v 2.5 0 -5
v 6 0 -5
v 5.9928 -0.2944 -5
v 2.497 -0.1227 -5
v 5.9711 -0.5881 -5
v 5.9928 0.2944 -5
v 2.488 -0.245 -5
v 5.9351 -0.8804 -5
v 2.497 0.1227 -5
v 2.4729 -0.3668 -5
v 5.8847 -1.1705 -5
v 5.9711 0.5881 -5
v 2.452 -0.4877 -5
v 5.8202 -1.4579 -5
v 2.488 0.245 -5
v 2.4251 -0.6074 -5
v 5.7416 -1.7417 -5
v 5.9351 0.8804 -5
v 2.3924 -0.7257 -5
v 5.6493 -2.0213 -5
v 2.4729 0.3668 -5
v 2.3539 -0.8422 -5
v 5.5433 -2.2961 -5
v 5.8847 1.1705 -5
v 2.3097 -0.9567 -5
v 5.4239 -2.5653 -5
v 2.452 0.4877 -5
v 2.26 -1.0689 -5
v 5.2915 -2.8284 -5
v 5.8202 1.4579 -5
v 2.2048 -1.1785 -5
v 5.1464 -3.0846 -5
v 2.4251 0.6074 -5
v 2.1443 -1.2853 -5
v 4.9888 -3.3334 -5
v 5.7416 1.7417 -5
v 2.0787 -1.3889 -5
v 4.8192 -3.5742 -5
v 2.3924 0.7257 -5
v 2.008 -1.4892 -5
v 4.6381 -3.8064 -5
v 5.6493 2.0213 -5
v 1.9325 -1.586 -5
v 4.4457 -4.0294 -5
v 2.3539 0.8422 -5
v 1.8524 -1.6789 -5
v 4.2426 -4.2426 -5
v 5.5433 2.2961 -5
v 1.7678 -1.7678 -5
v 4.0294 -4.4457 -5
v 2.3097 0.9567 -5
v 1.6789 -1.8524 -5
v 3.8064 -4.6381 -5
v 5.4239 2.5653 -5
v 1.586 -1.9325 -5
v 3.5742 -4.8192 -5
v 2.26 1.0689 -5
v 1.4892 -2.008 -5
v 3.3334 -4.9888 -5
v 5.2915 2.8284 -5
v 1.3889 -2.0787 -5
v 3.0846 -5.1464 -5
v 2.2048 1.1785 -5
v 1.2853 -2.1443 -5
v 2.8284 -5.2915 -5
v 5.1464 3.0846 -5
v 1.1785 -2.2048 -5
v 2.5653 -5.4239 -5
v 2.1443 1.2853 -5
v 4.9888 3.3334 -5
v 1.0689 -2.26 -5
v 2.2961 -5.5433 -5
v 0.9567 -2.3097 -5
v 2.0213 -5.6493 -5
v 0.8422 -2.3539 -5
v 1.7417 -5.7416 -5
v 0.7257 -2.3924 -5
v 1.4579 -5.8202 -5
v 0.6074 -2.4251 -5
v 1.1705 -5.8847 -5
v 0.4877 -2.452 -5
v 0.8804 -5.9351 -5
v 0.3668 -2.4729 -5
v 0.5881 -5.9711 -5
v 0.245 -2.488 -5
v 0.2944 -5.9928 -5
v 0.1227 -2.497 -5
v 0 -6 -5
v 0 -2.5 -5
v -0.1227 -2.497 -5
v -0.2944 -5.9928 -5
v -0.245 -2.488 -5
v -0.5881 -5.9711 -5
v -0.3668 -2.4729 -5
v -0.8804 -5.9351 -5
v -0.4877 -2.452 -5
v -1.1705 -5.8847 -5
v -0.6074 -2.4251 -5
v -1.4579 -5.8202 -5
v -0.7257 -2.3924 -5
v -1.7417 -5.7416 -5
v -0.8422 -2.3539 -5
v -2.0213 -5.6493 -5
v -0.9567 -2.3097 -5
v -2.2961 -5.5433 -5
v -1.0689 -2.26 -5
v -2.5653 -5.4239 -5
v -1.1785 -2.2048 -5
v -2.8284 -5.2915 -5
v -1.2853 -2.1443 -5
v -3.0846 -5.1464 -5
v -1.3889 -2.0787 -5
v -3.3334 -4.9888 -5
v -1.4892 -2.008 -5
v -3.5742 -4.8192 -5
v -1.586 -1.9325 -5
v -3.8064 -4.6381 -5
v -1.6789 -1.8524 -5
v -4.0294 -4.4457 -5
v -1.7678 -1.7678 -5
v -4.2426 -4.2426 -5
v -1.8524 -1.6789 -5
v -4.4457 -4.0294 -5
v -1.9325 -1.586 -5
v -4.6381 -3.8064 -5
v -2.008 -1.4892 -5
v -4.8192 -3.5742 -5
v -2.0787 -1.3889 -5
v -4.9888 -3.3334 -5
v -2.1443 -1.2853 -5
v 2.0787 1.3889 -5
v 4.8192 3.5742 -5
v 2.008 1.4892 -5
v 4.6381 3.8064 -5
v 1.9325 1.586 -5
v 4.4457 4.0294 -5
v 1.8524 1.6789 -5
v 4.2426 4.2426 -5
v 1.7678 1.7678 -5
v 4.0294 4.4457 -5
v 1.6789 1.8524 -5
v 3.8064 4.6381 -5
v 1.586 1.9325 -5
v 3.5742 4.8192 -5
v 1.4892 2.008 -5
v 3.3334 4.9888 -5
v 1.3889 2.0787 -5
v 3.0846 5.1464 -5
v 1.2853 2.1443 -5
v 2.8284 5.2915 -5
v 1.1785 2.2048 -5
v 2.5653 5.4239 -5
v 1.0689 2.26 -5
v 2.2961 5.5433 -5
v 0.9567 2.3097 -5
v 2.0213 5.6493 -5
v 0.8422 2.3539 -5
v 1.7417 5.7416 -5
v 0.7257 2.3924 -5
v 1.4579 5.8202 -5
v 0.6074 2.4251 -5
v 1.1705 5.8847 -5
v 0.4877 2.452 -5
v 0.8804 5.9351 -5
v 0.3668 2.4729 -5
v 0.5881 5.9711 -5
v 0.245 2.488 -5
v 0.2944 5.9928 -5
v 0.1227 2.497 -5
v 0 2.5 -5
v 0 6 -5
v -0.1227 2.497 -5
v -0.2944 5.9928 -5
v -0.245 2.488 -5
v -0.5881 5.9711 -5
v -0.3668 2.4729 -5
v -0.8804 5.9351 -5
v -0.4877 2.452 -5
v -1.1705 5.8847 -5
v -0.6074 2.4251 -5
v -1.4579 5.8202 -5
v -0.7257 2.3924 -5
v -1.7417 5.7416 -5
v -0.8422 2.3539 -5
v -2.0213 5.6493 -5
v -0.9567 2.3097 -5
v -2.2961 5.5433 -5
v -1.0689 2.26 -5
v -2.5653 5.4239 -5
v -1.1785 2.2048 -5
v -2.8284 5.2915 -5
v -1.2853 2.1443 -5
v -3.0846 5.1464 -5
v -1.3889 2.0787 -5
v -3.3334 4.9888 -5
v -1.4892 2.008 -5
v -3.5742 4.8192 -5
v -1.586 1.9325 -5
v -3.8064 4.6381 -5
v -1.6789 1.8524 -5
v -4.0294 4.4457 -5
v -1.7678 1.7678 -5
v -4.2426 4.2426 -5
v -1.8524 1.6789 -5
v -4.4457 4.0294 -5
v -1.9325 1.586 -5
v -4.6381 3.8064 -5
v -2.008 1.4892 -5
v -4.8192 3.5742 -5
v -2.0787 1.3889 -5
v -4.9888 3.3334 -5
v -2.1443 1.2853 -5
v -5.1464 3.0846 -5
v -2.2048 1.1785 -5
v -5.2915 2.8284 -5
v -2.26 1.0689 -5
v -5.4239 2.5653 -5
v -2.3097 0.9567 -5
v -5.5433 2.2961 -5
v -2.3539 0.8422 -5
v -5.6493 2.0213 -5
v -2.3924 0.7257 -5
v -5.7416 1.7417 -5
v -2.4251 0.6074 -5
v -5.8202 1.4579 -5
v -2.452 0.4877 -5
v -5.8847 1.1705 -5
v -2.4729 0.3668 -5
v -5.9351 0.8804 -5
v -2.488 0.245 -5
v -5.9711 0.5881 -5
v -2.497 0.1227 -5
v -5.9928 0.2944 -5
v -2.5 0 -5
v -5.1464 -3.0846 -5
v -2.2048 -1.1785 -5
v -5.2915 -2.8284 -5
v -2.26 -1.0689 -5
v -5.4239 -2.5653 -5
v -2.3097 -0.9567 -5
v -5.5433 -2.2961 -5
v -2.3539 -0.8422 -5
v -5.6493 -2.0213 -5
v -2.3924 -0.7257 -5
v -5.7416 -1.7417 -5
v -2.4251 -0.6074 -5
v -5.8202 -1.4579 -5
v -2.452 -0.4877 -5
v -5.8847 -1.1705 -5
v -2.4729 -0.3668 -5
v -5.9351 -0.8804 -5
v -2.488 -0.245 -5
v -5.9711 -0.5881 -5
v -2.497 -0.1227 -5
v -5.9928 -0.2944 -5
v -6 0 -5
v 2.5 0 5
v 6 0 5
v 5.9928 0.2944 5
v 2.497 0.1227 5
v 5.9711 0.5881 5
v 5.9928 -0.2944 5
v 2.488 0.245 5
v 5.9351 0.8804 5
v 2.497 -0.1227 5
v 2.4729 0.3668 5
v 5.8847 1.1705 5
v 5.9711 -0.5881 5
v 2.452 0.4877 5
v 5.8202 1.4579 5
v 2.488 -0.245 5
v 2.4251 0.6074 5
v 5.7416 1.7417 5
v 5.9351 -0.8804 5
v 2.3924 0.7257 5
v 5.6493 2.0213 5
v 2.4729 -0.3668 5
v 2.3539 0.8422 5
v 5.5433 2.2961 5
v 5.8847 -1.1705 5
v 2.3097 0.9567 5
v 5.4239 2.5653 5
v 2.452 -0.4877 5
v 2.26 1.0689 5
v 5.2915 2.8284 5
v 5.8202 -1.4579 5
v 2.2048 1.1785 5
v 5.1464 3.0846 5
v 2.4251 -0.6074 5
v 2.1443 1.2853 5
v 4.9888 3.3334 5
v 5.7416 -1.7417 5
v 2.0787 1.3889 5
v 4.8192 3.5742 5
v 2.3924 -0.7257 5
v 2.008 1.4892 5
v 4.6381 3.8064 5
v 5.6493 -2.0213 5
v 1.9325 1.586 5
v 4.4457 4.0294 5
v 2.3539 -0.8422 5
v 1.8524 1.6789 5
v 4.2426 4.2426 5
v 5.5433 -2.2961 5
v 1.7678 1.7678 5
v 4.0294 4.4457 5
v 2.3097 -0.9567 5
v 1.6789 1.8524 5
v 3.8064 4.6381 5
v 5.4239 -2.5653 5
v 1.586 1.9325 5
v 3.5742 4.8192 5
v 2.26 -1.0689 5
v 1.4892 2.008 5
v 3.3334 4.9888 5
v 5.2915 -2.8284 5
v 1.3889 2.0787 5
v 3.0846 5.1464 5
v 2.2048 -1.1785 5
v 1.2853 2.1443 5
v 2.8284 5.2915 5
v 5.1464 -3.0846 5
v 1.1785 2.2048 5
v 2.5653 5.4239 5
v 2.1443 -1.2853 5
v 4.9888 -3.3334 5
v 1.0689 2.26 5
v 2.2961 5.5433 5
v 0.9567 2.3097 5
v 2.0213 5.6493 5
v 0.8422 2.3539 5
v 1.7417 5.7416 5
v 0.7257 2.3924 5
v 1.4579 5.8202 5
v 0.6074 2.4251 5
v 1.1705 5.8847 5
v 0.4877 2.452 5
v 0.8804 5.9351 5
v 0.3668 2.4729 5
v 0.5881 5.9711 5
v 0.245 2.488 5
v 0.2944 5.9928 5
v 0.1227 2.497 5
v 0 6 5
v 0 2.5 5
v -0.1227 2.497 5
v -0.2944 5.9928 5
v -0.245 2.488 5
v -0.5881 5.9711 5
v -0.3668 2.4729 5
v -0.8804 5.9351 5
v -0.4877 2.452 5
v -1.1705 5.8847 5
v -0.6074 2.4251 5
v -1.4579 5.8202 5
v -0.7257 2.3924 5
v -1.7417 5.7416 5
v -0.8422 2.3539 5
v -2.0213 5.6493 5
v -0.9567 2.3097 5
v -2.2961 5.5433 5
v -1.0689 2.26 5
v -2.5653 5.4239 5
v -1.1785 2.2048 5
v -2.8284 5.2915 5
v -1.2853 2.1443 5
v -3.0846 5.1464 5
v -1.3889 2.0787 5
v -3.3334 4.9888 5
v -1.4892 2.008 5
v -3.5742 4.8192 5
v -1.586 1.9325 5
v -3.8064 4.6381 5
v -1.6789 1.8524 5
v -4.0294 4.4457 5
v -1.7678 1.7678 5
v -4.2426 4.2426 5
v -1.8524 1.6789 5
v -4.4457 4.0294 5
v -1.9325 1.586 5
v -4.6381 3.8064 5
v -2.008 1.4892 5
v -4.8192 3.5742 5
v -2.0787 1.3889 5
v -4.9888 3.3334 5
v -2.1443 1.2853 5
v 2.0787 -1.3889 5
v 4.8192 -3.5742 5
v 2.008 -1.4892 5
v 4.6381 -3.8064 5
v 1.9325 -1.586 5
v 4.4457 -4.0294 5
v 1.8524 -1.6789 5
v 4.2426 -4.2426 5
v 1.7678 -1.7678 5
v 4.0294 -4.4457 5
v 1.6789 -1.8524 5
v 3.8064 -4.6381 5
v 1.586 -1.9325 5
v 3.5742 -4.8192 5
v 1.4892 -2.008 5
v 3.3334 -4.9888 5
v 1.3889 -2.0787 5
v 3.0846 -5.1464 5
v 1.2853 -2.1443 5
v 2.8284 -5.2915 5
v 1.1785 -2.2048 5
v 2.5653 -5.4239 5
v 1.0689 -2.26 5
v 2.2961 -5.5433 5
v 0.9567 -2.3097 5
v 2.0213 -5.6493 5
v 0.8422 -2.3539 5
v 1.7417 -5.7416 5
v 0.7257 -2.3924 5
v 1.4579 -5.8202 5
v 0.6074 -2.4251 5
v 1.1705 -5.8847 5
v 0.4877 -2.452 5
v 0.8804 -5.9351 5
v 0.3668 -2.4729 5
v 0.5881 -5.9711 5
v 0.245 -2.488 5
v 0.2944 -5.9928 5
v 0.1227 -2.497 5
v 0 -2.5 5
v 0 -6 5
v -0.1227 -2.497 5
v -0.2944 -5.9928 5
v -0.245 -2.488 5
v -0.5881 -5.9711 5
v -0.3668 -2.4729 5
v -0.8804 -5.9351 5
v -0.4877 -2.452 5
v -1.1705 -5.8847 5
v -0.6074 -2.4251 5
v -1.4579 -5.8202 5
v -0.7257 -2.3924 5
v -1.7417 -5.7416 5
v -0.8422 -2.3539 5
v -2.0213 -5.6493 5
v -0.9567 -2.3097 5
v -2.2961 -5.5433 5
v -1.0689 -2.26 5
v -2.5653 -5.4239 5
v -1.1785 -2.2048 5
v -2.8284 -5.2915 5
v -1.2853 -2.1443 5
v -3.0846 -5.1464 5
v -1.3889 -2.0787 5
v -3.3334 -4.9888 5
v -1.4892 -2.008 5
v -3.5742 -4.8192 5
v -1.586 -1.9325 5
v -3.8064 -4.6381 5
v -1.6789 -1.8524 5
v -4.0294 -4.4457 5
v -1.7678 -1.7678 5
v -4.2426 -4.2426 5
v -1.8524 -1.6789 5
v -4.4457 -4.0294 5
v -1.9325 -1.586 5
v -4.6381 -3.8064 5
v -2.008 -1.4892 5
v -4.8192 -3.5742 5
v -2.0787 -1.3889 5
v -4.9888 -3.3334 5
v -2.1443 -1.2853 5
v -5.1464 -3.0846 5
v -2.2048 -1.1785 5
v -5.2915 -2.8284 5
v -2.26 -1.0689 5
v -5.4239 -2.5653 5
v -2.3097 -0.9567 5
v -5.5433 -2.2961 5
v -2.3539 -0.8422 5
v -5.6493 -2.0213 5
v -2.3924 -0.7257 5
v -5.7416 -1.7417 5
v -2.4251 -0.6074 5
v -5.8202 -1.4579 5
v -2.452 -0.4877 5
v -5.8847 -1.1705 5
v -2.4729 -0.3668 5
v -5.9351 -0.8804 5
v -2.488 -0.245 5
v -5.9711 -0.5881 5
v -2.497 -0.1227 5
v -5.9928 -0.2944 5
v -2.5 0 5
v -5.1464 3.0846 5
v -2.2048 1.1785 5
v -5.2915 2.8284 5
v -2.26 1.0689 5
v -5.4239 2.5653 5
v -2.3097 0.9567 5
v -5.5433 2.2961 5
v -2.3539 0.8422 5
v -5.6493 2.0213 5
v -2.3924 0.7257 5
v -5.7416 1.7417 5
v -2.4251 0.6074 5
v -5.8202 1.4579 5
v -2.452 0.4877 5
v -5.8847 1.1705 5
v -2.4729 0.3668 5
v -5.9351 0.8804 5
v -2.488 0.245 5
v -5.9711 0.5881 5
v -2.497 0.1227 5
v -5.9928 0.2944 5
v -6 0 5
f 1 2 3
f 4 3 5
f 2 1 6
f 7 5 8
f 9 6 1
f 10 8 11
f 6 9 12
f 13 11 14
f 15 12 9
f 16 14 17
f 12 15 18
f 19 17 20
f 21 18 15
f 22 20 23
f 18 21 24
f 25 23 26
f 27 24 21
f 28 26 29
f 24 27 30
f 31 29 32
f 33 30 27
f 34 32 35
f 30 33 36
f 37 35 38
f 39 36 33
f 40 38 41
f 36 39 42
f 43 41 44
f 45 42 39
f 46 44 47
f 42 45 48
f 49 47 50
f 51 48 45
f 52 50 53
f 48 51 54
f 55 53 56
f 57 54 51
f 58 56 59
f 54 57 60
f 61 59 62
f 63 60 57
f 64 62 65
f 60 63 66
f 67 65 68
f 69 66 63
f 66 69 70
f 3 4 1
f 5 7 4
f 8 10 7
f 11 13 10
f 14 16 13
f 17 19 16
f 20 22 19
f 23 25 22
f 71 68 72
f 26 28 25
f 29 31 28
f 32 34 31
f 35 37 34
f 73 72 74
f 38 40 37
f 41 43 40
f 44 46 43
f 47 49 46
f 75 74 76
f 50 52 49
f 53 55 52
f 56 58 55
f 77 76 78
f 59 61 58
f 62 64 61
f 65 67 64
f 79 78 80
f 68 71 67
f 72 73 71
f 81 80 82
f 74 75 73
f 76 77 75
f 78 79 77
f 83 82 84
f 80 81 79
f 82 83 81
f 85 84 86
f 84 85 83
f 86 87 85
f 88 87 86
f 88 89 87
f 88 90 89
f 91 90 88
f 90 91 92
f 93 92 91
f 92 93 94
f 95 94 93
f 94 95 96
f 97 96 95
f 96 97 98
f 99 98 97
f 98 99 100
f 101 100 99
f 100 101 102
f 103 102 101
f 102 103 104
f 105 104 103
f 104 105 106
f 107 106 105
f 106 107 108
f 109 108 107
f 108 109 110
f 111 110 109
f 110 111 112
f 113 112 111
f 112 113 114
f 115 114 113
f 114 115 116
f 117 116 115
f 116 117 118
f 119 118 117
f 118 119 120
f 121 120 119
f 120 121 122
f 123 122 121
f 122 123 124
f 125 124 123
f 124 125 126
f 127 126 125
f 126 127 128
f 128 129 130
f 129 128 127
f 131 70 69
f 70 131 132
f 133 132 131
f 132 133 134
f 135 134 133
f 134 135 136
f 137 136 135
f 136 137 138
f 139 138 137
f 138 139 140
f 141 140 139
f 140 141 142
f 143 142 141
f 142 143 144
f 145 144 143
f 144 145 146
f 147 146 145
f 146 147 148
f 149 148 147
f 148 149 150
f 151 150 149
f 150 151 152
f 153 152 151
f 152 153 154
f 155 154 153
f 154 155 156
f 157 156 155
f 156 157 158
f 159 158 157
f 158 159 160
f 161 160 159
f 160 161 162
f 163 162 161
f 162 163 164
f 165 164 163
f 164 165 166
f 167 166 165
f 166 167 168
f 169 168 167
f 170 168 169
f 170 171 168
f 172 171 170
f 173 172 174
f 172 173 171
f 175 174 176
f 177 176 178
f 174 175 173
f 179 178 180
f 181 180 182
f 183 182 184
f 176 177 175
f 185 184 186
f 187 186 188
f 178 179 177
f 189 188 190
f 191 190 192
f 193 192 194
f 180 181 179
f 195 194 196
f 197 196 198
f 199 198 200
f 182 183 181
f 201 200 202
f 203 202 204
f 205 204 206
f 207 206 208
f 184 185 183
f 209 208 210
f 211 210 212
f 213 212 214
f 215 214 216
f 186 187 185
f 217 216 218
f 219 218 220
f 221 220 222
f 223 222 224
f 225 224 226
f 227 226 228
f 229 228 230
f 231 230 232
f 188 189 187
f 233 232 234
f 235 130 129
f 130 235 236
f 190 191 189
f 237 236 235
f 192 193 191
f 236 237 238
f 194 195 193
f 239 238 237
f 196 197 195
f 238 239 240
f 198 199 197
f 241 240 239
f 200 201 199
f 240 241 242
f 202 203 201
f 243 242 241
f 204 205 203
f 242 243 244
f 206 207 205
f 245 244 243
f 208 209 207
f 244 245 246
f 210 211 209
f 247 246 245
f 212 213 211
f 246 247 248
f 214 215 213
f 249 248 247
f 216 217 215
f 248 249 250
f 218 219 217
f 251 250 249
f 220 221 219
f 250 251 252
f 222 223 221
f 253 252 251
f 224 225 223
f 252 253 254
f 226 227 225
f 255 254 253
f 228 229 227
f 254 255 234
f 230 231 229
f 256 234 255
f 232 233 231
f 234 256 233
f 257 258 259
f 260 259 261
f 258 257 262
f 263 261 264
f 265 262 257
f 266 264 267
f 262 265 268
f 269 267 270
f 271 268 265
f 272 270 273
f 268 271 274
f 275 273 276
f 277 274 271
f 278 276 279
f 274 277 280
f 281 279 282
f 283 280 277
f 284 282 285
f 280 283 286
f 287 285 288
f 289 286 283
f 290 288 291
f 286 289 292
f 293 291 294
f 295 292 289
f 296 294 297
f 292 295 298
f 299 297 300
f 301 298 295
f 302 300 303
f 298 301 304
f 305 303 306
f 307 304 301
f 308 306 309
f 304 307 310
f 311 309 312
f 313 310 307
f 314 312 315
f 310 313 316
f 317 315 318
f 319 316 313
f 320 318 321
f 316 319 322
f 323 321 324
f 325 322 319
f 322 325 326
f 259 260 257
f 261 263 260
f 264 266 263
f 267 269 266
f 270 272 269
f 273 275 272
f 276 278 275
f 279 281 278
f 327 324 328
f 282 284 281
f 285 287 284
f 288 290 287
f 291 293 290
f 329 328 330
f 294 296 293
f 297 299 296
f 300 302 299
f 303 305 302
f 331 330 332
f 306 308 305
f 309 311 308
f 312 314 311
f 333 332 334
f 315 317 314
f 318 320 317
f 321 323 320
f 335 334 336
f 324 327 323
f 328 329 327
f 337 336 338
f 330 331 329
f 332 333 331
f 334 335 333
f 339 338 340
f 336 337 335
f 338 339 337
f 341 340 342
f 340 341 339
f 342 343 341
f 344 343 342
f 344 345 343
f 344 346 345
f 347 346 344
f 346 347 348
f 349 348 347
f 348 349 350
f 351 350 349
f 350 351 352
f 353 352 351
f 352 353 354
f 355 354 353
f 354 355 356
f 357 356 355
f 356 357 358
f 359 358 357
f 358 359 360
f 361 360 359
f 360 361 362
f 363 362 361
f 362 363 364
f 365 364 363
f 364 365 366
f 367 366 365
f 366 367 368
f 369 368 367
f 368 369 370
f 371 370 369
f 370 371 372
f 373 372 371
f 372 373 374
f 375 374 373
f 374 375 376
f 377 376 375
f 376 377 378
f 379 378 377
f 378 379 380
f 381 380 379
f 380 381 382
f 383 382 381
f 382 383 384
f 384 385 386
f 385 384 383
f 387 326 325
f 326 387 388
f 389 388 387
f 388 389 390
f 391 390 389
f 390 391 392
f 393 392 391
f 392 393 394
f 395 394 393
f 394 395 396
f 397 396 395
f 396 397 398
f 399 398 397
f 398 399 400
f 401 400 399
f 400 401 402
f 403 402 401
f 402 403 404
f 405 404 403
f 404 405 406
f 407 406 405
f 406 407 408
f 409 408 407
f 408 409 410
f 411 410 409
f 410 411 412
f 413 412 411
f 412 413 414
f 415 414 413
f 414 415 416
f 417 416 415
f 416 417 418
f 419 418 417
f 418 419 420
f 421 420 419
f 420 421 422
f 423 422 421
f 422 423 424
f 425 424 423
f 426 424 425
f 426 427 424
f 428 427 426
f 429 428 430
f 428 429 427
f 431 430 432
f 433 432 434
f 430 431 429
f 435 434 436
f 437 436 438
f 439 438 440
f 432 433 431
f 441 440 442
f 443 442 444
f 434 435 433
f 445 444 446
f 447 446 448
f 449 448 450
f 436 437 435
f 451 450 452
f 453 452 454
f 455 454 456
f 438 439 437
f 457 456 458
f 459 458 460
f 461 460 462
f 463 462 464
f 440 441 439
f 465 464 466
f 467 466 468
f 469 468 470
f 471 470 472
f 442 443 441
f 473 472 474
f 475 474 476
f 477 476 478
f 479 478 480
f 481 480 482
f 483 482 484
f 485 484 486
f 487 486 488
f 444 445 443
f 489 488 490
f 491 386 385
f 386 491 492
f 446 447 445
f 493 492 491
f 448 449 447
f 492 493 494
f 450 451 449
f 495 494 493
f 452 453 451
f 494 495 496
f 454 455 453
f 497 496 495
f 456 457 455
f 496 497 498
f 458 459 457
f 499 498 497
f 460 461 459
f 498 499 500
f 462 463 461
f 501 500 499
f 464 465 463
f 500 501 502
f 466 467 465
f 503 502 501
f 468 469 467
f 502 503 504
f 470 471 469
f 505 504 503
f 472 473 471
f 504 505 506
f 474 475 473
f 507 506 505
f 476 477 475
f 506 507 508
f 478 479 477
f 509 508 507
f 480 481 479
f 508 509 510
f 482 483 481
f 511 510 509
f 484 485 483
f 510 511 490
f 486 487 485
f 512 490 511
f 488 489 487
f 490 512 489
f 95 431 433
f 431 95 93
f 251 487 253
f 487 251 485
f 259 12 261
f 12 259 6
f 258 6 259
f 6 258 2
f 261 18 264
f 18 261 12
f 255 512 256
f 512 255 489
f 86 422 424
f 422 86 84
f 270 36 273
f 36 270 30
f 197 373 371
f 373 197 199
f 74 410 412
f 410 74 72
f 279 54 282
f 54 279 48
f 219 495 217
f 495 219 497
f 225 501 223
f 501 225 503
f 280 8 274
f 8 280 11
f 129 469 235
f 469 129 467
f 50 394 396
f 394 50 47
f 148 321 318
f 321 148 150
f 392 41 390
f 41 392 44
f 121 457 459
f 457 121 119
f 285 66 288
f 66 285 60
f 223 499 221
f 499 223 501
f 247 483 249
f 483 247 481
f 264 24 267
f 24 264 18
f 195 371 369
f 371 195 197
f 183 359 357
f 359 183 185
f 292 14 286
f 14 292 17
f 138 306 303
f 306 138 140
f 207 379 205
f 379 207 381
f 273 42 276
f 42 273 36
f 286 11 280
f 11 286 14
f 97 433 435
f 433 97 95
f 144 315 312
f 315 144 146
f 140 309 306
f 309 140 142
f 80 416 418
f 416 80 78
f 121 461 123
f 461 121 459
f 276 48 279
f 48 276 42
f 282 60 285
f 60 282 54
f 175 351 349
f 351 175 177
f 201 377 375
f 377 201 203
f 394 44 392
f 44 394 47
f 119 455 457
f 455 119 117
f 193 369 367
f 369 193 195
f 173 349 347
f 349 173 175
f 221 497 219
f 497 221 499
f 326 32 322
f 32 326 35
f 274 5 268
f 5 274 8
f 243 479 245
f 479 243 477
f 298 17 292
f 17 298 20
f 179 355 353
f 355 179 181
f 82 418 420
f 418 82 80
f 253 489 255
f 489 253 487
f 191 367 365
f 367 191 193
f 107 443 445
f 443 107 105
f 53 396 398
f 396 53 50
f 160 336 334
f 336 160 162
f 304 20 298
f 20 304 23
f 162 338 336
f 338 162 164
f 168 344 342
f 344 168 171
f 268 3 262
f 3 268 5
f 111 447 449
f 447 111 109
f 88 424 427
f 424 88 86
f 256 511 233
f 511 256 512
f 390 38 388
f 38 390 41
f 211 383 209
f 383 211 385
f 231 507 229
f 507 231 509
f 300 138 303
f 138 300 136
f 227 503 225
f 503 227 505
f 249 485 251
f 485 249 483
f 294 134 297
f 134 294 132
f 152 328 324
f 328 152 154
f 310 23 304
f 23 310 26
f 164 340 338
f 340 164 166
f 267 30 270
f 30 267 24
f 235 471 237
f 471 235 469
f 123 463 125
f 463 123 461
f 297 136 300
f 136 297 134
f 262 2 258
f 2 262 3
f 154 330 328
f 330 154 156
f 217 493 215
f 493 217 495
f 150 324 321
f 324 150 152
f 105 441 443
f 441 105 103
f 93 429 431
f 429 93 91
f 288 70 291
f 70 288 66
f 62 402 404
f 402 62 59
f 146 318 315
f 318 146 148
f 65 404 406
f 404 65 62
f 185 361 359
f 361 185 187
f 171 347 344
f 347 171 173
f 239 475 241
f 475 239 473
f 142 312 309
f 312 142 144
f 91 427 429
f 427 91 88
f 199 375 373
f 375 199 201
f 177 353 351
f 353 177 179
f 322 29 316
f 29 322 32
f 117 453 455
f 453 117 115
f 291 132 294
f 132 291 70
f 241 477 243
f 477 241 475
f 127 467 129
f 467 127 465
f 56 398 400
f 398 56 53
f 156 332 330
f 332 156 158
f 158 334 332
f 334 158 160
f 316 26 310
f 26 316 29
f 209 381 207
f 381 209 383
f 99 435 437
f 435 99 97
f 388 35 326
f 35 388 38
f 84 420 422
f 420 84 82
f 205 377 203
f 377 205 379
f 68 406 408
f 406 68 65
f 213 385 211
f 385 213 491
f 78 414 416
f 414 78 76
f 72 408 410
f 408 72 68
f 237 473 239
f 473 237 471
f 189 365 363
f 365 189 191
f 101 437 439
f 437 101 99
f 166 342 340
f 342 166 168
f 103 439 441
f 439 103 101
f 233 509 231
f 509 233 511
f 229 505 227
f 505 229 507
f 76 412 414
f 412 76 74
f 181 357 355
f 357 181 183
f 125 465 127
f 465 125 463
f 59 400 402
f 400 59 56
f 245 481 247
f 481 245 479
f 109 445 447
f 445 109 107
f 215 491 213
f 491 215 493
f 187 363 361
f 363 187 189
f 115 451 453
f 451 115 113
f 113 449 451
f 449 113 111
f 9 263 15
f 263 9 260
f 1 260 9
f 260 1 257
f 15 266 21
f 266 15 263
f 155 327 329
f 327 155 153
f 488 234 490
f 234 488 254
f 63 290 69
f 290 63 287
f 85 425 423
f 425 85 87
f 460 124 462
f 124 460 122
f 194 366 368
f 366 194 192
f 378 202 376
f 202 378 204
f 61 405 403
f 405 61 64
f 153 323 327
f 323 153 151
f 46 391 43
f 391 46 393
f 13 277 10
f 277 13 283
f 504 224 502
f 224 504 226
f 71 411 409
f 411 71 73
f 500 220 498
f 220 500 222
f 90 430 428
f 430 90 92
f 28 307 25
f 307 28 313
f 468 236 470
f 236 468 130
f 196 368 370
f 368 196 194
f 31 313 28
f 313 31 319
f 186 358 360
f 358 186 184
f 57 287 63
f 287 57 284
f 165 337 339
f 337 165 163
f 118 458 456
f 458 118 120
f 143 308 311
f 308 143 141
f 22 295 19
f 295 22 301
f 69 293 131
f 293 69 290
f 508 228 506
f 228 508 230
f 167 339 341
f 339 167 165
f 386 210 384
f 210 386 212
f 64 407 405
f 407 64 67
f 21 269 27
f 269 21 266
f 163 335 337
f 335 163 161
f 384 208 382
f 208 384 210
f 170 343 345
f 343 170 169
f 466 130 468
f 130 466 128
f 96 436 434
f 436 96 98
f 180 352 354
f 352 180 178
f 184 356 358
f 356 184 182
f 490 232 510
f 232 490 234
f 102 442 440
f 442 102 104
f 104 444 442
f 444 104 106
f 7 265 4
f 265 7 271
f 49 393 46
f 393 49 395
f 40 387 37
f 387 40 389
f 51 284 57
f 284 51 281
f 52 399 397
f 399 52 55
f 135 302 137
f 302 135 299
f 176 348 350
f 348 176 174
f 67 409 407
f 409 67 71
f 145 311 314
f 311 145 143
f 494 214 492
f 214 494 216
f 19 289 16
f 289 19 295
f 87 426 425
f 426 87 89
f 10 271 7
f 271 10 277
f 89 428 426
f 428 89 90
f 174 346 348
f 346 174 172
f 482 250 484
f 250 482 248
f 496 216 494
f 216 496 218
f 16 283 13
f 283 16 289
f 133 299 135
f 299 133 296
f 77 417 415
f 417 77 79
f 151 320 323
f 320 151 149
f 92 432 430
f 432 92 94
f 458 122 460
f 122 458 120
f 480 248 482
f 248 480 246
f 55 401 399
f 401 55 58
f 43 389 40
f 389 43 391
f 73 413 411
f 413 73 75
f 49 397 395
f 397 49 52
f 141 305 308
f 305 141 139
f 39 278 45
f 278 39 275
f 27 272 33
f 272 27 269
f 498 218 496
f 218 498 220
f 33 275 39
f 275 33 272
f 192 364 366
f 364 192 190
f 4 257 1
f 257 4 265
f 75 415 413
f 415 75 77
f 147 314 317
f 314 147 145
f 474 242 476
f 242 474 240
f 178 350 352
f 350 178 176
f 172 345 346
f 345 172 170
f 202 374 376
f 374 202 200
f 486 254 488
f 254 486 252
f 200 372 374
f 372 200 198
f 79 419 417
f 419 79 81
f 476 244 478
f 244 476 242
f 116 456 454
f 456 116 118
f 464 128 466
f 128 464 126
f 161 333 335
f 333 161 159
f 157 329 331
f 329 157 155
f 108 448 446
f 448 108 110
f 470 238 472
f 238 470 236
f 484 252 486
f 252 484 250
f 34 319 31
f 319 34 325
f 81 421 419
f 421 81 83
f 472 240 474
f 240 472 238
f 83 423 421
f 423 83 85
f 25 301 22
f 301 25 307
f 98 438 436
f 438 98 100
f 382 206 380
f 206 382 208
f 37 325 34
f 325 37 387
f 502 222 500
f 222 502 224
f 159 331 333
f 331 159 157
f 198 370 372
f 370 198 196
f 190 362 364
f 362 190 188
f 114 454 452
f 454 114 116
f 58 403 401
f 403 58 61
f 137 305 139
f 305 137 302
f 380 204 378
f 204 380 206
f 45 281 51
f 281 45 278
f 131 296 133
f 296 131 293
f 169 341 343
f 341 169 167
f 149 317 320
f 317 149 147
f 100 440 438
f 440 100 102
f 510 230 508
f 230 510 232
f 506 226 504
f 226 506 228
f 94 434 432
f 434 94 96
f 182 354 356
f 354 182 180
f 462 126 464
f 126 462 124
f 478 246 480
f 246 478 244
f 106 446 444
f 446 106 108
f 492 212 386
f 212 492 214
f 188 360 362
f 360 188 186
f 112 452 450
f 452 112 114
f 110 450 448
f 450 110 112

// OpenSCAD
$fn=128;

teeth = 16;
pitch_d = 9.75;
pitch_r = pitch_d/2;

pulley_width = 10;
hub_d = 12;
bore_d = 5;

tooth_height = 1.2;
tooth_tip_width = 1.2;
tooth_root_width = 2.0;

root_r = pitch_r - tooth_height/2;
tip_r  = pitch_r + tooth_height/2;

module tooth2d() {
    polygon(points=[
        [root_r, -tooth_root_width/2],
        [tip_r,  -tooth_tip_width/2],
        [tip_r,   tooth_tip_width/2],
        [root_r,  tooth_root_width/2]
    ]);
}

module teeth_ring() {
    for(i=[0:teeth-1]) {
        rotate([0,0, i*360/teeth])
            linear_extrude(height=pulley_width, center=true, convexity=10)
                tooth2d();
    }
}

module body() {
    cylinder(d=hub_d, h=pulley_width, center=true);
}

module pulley() {
    difference() {
        union() {
            body();
            teeth_ring();
        }
        cylinder(d=bore_d, h=pulley_width+2, center=true);
    }
}

pulley();
